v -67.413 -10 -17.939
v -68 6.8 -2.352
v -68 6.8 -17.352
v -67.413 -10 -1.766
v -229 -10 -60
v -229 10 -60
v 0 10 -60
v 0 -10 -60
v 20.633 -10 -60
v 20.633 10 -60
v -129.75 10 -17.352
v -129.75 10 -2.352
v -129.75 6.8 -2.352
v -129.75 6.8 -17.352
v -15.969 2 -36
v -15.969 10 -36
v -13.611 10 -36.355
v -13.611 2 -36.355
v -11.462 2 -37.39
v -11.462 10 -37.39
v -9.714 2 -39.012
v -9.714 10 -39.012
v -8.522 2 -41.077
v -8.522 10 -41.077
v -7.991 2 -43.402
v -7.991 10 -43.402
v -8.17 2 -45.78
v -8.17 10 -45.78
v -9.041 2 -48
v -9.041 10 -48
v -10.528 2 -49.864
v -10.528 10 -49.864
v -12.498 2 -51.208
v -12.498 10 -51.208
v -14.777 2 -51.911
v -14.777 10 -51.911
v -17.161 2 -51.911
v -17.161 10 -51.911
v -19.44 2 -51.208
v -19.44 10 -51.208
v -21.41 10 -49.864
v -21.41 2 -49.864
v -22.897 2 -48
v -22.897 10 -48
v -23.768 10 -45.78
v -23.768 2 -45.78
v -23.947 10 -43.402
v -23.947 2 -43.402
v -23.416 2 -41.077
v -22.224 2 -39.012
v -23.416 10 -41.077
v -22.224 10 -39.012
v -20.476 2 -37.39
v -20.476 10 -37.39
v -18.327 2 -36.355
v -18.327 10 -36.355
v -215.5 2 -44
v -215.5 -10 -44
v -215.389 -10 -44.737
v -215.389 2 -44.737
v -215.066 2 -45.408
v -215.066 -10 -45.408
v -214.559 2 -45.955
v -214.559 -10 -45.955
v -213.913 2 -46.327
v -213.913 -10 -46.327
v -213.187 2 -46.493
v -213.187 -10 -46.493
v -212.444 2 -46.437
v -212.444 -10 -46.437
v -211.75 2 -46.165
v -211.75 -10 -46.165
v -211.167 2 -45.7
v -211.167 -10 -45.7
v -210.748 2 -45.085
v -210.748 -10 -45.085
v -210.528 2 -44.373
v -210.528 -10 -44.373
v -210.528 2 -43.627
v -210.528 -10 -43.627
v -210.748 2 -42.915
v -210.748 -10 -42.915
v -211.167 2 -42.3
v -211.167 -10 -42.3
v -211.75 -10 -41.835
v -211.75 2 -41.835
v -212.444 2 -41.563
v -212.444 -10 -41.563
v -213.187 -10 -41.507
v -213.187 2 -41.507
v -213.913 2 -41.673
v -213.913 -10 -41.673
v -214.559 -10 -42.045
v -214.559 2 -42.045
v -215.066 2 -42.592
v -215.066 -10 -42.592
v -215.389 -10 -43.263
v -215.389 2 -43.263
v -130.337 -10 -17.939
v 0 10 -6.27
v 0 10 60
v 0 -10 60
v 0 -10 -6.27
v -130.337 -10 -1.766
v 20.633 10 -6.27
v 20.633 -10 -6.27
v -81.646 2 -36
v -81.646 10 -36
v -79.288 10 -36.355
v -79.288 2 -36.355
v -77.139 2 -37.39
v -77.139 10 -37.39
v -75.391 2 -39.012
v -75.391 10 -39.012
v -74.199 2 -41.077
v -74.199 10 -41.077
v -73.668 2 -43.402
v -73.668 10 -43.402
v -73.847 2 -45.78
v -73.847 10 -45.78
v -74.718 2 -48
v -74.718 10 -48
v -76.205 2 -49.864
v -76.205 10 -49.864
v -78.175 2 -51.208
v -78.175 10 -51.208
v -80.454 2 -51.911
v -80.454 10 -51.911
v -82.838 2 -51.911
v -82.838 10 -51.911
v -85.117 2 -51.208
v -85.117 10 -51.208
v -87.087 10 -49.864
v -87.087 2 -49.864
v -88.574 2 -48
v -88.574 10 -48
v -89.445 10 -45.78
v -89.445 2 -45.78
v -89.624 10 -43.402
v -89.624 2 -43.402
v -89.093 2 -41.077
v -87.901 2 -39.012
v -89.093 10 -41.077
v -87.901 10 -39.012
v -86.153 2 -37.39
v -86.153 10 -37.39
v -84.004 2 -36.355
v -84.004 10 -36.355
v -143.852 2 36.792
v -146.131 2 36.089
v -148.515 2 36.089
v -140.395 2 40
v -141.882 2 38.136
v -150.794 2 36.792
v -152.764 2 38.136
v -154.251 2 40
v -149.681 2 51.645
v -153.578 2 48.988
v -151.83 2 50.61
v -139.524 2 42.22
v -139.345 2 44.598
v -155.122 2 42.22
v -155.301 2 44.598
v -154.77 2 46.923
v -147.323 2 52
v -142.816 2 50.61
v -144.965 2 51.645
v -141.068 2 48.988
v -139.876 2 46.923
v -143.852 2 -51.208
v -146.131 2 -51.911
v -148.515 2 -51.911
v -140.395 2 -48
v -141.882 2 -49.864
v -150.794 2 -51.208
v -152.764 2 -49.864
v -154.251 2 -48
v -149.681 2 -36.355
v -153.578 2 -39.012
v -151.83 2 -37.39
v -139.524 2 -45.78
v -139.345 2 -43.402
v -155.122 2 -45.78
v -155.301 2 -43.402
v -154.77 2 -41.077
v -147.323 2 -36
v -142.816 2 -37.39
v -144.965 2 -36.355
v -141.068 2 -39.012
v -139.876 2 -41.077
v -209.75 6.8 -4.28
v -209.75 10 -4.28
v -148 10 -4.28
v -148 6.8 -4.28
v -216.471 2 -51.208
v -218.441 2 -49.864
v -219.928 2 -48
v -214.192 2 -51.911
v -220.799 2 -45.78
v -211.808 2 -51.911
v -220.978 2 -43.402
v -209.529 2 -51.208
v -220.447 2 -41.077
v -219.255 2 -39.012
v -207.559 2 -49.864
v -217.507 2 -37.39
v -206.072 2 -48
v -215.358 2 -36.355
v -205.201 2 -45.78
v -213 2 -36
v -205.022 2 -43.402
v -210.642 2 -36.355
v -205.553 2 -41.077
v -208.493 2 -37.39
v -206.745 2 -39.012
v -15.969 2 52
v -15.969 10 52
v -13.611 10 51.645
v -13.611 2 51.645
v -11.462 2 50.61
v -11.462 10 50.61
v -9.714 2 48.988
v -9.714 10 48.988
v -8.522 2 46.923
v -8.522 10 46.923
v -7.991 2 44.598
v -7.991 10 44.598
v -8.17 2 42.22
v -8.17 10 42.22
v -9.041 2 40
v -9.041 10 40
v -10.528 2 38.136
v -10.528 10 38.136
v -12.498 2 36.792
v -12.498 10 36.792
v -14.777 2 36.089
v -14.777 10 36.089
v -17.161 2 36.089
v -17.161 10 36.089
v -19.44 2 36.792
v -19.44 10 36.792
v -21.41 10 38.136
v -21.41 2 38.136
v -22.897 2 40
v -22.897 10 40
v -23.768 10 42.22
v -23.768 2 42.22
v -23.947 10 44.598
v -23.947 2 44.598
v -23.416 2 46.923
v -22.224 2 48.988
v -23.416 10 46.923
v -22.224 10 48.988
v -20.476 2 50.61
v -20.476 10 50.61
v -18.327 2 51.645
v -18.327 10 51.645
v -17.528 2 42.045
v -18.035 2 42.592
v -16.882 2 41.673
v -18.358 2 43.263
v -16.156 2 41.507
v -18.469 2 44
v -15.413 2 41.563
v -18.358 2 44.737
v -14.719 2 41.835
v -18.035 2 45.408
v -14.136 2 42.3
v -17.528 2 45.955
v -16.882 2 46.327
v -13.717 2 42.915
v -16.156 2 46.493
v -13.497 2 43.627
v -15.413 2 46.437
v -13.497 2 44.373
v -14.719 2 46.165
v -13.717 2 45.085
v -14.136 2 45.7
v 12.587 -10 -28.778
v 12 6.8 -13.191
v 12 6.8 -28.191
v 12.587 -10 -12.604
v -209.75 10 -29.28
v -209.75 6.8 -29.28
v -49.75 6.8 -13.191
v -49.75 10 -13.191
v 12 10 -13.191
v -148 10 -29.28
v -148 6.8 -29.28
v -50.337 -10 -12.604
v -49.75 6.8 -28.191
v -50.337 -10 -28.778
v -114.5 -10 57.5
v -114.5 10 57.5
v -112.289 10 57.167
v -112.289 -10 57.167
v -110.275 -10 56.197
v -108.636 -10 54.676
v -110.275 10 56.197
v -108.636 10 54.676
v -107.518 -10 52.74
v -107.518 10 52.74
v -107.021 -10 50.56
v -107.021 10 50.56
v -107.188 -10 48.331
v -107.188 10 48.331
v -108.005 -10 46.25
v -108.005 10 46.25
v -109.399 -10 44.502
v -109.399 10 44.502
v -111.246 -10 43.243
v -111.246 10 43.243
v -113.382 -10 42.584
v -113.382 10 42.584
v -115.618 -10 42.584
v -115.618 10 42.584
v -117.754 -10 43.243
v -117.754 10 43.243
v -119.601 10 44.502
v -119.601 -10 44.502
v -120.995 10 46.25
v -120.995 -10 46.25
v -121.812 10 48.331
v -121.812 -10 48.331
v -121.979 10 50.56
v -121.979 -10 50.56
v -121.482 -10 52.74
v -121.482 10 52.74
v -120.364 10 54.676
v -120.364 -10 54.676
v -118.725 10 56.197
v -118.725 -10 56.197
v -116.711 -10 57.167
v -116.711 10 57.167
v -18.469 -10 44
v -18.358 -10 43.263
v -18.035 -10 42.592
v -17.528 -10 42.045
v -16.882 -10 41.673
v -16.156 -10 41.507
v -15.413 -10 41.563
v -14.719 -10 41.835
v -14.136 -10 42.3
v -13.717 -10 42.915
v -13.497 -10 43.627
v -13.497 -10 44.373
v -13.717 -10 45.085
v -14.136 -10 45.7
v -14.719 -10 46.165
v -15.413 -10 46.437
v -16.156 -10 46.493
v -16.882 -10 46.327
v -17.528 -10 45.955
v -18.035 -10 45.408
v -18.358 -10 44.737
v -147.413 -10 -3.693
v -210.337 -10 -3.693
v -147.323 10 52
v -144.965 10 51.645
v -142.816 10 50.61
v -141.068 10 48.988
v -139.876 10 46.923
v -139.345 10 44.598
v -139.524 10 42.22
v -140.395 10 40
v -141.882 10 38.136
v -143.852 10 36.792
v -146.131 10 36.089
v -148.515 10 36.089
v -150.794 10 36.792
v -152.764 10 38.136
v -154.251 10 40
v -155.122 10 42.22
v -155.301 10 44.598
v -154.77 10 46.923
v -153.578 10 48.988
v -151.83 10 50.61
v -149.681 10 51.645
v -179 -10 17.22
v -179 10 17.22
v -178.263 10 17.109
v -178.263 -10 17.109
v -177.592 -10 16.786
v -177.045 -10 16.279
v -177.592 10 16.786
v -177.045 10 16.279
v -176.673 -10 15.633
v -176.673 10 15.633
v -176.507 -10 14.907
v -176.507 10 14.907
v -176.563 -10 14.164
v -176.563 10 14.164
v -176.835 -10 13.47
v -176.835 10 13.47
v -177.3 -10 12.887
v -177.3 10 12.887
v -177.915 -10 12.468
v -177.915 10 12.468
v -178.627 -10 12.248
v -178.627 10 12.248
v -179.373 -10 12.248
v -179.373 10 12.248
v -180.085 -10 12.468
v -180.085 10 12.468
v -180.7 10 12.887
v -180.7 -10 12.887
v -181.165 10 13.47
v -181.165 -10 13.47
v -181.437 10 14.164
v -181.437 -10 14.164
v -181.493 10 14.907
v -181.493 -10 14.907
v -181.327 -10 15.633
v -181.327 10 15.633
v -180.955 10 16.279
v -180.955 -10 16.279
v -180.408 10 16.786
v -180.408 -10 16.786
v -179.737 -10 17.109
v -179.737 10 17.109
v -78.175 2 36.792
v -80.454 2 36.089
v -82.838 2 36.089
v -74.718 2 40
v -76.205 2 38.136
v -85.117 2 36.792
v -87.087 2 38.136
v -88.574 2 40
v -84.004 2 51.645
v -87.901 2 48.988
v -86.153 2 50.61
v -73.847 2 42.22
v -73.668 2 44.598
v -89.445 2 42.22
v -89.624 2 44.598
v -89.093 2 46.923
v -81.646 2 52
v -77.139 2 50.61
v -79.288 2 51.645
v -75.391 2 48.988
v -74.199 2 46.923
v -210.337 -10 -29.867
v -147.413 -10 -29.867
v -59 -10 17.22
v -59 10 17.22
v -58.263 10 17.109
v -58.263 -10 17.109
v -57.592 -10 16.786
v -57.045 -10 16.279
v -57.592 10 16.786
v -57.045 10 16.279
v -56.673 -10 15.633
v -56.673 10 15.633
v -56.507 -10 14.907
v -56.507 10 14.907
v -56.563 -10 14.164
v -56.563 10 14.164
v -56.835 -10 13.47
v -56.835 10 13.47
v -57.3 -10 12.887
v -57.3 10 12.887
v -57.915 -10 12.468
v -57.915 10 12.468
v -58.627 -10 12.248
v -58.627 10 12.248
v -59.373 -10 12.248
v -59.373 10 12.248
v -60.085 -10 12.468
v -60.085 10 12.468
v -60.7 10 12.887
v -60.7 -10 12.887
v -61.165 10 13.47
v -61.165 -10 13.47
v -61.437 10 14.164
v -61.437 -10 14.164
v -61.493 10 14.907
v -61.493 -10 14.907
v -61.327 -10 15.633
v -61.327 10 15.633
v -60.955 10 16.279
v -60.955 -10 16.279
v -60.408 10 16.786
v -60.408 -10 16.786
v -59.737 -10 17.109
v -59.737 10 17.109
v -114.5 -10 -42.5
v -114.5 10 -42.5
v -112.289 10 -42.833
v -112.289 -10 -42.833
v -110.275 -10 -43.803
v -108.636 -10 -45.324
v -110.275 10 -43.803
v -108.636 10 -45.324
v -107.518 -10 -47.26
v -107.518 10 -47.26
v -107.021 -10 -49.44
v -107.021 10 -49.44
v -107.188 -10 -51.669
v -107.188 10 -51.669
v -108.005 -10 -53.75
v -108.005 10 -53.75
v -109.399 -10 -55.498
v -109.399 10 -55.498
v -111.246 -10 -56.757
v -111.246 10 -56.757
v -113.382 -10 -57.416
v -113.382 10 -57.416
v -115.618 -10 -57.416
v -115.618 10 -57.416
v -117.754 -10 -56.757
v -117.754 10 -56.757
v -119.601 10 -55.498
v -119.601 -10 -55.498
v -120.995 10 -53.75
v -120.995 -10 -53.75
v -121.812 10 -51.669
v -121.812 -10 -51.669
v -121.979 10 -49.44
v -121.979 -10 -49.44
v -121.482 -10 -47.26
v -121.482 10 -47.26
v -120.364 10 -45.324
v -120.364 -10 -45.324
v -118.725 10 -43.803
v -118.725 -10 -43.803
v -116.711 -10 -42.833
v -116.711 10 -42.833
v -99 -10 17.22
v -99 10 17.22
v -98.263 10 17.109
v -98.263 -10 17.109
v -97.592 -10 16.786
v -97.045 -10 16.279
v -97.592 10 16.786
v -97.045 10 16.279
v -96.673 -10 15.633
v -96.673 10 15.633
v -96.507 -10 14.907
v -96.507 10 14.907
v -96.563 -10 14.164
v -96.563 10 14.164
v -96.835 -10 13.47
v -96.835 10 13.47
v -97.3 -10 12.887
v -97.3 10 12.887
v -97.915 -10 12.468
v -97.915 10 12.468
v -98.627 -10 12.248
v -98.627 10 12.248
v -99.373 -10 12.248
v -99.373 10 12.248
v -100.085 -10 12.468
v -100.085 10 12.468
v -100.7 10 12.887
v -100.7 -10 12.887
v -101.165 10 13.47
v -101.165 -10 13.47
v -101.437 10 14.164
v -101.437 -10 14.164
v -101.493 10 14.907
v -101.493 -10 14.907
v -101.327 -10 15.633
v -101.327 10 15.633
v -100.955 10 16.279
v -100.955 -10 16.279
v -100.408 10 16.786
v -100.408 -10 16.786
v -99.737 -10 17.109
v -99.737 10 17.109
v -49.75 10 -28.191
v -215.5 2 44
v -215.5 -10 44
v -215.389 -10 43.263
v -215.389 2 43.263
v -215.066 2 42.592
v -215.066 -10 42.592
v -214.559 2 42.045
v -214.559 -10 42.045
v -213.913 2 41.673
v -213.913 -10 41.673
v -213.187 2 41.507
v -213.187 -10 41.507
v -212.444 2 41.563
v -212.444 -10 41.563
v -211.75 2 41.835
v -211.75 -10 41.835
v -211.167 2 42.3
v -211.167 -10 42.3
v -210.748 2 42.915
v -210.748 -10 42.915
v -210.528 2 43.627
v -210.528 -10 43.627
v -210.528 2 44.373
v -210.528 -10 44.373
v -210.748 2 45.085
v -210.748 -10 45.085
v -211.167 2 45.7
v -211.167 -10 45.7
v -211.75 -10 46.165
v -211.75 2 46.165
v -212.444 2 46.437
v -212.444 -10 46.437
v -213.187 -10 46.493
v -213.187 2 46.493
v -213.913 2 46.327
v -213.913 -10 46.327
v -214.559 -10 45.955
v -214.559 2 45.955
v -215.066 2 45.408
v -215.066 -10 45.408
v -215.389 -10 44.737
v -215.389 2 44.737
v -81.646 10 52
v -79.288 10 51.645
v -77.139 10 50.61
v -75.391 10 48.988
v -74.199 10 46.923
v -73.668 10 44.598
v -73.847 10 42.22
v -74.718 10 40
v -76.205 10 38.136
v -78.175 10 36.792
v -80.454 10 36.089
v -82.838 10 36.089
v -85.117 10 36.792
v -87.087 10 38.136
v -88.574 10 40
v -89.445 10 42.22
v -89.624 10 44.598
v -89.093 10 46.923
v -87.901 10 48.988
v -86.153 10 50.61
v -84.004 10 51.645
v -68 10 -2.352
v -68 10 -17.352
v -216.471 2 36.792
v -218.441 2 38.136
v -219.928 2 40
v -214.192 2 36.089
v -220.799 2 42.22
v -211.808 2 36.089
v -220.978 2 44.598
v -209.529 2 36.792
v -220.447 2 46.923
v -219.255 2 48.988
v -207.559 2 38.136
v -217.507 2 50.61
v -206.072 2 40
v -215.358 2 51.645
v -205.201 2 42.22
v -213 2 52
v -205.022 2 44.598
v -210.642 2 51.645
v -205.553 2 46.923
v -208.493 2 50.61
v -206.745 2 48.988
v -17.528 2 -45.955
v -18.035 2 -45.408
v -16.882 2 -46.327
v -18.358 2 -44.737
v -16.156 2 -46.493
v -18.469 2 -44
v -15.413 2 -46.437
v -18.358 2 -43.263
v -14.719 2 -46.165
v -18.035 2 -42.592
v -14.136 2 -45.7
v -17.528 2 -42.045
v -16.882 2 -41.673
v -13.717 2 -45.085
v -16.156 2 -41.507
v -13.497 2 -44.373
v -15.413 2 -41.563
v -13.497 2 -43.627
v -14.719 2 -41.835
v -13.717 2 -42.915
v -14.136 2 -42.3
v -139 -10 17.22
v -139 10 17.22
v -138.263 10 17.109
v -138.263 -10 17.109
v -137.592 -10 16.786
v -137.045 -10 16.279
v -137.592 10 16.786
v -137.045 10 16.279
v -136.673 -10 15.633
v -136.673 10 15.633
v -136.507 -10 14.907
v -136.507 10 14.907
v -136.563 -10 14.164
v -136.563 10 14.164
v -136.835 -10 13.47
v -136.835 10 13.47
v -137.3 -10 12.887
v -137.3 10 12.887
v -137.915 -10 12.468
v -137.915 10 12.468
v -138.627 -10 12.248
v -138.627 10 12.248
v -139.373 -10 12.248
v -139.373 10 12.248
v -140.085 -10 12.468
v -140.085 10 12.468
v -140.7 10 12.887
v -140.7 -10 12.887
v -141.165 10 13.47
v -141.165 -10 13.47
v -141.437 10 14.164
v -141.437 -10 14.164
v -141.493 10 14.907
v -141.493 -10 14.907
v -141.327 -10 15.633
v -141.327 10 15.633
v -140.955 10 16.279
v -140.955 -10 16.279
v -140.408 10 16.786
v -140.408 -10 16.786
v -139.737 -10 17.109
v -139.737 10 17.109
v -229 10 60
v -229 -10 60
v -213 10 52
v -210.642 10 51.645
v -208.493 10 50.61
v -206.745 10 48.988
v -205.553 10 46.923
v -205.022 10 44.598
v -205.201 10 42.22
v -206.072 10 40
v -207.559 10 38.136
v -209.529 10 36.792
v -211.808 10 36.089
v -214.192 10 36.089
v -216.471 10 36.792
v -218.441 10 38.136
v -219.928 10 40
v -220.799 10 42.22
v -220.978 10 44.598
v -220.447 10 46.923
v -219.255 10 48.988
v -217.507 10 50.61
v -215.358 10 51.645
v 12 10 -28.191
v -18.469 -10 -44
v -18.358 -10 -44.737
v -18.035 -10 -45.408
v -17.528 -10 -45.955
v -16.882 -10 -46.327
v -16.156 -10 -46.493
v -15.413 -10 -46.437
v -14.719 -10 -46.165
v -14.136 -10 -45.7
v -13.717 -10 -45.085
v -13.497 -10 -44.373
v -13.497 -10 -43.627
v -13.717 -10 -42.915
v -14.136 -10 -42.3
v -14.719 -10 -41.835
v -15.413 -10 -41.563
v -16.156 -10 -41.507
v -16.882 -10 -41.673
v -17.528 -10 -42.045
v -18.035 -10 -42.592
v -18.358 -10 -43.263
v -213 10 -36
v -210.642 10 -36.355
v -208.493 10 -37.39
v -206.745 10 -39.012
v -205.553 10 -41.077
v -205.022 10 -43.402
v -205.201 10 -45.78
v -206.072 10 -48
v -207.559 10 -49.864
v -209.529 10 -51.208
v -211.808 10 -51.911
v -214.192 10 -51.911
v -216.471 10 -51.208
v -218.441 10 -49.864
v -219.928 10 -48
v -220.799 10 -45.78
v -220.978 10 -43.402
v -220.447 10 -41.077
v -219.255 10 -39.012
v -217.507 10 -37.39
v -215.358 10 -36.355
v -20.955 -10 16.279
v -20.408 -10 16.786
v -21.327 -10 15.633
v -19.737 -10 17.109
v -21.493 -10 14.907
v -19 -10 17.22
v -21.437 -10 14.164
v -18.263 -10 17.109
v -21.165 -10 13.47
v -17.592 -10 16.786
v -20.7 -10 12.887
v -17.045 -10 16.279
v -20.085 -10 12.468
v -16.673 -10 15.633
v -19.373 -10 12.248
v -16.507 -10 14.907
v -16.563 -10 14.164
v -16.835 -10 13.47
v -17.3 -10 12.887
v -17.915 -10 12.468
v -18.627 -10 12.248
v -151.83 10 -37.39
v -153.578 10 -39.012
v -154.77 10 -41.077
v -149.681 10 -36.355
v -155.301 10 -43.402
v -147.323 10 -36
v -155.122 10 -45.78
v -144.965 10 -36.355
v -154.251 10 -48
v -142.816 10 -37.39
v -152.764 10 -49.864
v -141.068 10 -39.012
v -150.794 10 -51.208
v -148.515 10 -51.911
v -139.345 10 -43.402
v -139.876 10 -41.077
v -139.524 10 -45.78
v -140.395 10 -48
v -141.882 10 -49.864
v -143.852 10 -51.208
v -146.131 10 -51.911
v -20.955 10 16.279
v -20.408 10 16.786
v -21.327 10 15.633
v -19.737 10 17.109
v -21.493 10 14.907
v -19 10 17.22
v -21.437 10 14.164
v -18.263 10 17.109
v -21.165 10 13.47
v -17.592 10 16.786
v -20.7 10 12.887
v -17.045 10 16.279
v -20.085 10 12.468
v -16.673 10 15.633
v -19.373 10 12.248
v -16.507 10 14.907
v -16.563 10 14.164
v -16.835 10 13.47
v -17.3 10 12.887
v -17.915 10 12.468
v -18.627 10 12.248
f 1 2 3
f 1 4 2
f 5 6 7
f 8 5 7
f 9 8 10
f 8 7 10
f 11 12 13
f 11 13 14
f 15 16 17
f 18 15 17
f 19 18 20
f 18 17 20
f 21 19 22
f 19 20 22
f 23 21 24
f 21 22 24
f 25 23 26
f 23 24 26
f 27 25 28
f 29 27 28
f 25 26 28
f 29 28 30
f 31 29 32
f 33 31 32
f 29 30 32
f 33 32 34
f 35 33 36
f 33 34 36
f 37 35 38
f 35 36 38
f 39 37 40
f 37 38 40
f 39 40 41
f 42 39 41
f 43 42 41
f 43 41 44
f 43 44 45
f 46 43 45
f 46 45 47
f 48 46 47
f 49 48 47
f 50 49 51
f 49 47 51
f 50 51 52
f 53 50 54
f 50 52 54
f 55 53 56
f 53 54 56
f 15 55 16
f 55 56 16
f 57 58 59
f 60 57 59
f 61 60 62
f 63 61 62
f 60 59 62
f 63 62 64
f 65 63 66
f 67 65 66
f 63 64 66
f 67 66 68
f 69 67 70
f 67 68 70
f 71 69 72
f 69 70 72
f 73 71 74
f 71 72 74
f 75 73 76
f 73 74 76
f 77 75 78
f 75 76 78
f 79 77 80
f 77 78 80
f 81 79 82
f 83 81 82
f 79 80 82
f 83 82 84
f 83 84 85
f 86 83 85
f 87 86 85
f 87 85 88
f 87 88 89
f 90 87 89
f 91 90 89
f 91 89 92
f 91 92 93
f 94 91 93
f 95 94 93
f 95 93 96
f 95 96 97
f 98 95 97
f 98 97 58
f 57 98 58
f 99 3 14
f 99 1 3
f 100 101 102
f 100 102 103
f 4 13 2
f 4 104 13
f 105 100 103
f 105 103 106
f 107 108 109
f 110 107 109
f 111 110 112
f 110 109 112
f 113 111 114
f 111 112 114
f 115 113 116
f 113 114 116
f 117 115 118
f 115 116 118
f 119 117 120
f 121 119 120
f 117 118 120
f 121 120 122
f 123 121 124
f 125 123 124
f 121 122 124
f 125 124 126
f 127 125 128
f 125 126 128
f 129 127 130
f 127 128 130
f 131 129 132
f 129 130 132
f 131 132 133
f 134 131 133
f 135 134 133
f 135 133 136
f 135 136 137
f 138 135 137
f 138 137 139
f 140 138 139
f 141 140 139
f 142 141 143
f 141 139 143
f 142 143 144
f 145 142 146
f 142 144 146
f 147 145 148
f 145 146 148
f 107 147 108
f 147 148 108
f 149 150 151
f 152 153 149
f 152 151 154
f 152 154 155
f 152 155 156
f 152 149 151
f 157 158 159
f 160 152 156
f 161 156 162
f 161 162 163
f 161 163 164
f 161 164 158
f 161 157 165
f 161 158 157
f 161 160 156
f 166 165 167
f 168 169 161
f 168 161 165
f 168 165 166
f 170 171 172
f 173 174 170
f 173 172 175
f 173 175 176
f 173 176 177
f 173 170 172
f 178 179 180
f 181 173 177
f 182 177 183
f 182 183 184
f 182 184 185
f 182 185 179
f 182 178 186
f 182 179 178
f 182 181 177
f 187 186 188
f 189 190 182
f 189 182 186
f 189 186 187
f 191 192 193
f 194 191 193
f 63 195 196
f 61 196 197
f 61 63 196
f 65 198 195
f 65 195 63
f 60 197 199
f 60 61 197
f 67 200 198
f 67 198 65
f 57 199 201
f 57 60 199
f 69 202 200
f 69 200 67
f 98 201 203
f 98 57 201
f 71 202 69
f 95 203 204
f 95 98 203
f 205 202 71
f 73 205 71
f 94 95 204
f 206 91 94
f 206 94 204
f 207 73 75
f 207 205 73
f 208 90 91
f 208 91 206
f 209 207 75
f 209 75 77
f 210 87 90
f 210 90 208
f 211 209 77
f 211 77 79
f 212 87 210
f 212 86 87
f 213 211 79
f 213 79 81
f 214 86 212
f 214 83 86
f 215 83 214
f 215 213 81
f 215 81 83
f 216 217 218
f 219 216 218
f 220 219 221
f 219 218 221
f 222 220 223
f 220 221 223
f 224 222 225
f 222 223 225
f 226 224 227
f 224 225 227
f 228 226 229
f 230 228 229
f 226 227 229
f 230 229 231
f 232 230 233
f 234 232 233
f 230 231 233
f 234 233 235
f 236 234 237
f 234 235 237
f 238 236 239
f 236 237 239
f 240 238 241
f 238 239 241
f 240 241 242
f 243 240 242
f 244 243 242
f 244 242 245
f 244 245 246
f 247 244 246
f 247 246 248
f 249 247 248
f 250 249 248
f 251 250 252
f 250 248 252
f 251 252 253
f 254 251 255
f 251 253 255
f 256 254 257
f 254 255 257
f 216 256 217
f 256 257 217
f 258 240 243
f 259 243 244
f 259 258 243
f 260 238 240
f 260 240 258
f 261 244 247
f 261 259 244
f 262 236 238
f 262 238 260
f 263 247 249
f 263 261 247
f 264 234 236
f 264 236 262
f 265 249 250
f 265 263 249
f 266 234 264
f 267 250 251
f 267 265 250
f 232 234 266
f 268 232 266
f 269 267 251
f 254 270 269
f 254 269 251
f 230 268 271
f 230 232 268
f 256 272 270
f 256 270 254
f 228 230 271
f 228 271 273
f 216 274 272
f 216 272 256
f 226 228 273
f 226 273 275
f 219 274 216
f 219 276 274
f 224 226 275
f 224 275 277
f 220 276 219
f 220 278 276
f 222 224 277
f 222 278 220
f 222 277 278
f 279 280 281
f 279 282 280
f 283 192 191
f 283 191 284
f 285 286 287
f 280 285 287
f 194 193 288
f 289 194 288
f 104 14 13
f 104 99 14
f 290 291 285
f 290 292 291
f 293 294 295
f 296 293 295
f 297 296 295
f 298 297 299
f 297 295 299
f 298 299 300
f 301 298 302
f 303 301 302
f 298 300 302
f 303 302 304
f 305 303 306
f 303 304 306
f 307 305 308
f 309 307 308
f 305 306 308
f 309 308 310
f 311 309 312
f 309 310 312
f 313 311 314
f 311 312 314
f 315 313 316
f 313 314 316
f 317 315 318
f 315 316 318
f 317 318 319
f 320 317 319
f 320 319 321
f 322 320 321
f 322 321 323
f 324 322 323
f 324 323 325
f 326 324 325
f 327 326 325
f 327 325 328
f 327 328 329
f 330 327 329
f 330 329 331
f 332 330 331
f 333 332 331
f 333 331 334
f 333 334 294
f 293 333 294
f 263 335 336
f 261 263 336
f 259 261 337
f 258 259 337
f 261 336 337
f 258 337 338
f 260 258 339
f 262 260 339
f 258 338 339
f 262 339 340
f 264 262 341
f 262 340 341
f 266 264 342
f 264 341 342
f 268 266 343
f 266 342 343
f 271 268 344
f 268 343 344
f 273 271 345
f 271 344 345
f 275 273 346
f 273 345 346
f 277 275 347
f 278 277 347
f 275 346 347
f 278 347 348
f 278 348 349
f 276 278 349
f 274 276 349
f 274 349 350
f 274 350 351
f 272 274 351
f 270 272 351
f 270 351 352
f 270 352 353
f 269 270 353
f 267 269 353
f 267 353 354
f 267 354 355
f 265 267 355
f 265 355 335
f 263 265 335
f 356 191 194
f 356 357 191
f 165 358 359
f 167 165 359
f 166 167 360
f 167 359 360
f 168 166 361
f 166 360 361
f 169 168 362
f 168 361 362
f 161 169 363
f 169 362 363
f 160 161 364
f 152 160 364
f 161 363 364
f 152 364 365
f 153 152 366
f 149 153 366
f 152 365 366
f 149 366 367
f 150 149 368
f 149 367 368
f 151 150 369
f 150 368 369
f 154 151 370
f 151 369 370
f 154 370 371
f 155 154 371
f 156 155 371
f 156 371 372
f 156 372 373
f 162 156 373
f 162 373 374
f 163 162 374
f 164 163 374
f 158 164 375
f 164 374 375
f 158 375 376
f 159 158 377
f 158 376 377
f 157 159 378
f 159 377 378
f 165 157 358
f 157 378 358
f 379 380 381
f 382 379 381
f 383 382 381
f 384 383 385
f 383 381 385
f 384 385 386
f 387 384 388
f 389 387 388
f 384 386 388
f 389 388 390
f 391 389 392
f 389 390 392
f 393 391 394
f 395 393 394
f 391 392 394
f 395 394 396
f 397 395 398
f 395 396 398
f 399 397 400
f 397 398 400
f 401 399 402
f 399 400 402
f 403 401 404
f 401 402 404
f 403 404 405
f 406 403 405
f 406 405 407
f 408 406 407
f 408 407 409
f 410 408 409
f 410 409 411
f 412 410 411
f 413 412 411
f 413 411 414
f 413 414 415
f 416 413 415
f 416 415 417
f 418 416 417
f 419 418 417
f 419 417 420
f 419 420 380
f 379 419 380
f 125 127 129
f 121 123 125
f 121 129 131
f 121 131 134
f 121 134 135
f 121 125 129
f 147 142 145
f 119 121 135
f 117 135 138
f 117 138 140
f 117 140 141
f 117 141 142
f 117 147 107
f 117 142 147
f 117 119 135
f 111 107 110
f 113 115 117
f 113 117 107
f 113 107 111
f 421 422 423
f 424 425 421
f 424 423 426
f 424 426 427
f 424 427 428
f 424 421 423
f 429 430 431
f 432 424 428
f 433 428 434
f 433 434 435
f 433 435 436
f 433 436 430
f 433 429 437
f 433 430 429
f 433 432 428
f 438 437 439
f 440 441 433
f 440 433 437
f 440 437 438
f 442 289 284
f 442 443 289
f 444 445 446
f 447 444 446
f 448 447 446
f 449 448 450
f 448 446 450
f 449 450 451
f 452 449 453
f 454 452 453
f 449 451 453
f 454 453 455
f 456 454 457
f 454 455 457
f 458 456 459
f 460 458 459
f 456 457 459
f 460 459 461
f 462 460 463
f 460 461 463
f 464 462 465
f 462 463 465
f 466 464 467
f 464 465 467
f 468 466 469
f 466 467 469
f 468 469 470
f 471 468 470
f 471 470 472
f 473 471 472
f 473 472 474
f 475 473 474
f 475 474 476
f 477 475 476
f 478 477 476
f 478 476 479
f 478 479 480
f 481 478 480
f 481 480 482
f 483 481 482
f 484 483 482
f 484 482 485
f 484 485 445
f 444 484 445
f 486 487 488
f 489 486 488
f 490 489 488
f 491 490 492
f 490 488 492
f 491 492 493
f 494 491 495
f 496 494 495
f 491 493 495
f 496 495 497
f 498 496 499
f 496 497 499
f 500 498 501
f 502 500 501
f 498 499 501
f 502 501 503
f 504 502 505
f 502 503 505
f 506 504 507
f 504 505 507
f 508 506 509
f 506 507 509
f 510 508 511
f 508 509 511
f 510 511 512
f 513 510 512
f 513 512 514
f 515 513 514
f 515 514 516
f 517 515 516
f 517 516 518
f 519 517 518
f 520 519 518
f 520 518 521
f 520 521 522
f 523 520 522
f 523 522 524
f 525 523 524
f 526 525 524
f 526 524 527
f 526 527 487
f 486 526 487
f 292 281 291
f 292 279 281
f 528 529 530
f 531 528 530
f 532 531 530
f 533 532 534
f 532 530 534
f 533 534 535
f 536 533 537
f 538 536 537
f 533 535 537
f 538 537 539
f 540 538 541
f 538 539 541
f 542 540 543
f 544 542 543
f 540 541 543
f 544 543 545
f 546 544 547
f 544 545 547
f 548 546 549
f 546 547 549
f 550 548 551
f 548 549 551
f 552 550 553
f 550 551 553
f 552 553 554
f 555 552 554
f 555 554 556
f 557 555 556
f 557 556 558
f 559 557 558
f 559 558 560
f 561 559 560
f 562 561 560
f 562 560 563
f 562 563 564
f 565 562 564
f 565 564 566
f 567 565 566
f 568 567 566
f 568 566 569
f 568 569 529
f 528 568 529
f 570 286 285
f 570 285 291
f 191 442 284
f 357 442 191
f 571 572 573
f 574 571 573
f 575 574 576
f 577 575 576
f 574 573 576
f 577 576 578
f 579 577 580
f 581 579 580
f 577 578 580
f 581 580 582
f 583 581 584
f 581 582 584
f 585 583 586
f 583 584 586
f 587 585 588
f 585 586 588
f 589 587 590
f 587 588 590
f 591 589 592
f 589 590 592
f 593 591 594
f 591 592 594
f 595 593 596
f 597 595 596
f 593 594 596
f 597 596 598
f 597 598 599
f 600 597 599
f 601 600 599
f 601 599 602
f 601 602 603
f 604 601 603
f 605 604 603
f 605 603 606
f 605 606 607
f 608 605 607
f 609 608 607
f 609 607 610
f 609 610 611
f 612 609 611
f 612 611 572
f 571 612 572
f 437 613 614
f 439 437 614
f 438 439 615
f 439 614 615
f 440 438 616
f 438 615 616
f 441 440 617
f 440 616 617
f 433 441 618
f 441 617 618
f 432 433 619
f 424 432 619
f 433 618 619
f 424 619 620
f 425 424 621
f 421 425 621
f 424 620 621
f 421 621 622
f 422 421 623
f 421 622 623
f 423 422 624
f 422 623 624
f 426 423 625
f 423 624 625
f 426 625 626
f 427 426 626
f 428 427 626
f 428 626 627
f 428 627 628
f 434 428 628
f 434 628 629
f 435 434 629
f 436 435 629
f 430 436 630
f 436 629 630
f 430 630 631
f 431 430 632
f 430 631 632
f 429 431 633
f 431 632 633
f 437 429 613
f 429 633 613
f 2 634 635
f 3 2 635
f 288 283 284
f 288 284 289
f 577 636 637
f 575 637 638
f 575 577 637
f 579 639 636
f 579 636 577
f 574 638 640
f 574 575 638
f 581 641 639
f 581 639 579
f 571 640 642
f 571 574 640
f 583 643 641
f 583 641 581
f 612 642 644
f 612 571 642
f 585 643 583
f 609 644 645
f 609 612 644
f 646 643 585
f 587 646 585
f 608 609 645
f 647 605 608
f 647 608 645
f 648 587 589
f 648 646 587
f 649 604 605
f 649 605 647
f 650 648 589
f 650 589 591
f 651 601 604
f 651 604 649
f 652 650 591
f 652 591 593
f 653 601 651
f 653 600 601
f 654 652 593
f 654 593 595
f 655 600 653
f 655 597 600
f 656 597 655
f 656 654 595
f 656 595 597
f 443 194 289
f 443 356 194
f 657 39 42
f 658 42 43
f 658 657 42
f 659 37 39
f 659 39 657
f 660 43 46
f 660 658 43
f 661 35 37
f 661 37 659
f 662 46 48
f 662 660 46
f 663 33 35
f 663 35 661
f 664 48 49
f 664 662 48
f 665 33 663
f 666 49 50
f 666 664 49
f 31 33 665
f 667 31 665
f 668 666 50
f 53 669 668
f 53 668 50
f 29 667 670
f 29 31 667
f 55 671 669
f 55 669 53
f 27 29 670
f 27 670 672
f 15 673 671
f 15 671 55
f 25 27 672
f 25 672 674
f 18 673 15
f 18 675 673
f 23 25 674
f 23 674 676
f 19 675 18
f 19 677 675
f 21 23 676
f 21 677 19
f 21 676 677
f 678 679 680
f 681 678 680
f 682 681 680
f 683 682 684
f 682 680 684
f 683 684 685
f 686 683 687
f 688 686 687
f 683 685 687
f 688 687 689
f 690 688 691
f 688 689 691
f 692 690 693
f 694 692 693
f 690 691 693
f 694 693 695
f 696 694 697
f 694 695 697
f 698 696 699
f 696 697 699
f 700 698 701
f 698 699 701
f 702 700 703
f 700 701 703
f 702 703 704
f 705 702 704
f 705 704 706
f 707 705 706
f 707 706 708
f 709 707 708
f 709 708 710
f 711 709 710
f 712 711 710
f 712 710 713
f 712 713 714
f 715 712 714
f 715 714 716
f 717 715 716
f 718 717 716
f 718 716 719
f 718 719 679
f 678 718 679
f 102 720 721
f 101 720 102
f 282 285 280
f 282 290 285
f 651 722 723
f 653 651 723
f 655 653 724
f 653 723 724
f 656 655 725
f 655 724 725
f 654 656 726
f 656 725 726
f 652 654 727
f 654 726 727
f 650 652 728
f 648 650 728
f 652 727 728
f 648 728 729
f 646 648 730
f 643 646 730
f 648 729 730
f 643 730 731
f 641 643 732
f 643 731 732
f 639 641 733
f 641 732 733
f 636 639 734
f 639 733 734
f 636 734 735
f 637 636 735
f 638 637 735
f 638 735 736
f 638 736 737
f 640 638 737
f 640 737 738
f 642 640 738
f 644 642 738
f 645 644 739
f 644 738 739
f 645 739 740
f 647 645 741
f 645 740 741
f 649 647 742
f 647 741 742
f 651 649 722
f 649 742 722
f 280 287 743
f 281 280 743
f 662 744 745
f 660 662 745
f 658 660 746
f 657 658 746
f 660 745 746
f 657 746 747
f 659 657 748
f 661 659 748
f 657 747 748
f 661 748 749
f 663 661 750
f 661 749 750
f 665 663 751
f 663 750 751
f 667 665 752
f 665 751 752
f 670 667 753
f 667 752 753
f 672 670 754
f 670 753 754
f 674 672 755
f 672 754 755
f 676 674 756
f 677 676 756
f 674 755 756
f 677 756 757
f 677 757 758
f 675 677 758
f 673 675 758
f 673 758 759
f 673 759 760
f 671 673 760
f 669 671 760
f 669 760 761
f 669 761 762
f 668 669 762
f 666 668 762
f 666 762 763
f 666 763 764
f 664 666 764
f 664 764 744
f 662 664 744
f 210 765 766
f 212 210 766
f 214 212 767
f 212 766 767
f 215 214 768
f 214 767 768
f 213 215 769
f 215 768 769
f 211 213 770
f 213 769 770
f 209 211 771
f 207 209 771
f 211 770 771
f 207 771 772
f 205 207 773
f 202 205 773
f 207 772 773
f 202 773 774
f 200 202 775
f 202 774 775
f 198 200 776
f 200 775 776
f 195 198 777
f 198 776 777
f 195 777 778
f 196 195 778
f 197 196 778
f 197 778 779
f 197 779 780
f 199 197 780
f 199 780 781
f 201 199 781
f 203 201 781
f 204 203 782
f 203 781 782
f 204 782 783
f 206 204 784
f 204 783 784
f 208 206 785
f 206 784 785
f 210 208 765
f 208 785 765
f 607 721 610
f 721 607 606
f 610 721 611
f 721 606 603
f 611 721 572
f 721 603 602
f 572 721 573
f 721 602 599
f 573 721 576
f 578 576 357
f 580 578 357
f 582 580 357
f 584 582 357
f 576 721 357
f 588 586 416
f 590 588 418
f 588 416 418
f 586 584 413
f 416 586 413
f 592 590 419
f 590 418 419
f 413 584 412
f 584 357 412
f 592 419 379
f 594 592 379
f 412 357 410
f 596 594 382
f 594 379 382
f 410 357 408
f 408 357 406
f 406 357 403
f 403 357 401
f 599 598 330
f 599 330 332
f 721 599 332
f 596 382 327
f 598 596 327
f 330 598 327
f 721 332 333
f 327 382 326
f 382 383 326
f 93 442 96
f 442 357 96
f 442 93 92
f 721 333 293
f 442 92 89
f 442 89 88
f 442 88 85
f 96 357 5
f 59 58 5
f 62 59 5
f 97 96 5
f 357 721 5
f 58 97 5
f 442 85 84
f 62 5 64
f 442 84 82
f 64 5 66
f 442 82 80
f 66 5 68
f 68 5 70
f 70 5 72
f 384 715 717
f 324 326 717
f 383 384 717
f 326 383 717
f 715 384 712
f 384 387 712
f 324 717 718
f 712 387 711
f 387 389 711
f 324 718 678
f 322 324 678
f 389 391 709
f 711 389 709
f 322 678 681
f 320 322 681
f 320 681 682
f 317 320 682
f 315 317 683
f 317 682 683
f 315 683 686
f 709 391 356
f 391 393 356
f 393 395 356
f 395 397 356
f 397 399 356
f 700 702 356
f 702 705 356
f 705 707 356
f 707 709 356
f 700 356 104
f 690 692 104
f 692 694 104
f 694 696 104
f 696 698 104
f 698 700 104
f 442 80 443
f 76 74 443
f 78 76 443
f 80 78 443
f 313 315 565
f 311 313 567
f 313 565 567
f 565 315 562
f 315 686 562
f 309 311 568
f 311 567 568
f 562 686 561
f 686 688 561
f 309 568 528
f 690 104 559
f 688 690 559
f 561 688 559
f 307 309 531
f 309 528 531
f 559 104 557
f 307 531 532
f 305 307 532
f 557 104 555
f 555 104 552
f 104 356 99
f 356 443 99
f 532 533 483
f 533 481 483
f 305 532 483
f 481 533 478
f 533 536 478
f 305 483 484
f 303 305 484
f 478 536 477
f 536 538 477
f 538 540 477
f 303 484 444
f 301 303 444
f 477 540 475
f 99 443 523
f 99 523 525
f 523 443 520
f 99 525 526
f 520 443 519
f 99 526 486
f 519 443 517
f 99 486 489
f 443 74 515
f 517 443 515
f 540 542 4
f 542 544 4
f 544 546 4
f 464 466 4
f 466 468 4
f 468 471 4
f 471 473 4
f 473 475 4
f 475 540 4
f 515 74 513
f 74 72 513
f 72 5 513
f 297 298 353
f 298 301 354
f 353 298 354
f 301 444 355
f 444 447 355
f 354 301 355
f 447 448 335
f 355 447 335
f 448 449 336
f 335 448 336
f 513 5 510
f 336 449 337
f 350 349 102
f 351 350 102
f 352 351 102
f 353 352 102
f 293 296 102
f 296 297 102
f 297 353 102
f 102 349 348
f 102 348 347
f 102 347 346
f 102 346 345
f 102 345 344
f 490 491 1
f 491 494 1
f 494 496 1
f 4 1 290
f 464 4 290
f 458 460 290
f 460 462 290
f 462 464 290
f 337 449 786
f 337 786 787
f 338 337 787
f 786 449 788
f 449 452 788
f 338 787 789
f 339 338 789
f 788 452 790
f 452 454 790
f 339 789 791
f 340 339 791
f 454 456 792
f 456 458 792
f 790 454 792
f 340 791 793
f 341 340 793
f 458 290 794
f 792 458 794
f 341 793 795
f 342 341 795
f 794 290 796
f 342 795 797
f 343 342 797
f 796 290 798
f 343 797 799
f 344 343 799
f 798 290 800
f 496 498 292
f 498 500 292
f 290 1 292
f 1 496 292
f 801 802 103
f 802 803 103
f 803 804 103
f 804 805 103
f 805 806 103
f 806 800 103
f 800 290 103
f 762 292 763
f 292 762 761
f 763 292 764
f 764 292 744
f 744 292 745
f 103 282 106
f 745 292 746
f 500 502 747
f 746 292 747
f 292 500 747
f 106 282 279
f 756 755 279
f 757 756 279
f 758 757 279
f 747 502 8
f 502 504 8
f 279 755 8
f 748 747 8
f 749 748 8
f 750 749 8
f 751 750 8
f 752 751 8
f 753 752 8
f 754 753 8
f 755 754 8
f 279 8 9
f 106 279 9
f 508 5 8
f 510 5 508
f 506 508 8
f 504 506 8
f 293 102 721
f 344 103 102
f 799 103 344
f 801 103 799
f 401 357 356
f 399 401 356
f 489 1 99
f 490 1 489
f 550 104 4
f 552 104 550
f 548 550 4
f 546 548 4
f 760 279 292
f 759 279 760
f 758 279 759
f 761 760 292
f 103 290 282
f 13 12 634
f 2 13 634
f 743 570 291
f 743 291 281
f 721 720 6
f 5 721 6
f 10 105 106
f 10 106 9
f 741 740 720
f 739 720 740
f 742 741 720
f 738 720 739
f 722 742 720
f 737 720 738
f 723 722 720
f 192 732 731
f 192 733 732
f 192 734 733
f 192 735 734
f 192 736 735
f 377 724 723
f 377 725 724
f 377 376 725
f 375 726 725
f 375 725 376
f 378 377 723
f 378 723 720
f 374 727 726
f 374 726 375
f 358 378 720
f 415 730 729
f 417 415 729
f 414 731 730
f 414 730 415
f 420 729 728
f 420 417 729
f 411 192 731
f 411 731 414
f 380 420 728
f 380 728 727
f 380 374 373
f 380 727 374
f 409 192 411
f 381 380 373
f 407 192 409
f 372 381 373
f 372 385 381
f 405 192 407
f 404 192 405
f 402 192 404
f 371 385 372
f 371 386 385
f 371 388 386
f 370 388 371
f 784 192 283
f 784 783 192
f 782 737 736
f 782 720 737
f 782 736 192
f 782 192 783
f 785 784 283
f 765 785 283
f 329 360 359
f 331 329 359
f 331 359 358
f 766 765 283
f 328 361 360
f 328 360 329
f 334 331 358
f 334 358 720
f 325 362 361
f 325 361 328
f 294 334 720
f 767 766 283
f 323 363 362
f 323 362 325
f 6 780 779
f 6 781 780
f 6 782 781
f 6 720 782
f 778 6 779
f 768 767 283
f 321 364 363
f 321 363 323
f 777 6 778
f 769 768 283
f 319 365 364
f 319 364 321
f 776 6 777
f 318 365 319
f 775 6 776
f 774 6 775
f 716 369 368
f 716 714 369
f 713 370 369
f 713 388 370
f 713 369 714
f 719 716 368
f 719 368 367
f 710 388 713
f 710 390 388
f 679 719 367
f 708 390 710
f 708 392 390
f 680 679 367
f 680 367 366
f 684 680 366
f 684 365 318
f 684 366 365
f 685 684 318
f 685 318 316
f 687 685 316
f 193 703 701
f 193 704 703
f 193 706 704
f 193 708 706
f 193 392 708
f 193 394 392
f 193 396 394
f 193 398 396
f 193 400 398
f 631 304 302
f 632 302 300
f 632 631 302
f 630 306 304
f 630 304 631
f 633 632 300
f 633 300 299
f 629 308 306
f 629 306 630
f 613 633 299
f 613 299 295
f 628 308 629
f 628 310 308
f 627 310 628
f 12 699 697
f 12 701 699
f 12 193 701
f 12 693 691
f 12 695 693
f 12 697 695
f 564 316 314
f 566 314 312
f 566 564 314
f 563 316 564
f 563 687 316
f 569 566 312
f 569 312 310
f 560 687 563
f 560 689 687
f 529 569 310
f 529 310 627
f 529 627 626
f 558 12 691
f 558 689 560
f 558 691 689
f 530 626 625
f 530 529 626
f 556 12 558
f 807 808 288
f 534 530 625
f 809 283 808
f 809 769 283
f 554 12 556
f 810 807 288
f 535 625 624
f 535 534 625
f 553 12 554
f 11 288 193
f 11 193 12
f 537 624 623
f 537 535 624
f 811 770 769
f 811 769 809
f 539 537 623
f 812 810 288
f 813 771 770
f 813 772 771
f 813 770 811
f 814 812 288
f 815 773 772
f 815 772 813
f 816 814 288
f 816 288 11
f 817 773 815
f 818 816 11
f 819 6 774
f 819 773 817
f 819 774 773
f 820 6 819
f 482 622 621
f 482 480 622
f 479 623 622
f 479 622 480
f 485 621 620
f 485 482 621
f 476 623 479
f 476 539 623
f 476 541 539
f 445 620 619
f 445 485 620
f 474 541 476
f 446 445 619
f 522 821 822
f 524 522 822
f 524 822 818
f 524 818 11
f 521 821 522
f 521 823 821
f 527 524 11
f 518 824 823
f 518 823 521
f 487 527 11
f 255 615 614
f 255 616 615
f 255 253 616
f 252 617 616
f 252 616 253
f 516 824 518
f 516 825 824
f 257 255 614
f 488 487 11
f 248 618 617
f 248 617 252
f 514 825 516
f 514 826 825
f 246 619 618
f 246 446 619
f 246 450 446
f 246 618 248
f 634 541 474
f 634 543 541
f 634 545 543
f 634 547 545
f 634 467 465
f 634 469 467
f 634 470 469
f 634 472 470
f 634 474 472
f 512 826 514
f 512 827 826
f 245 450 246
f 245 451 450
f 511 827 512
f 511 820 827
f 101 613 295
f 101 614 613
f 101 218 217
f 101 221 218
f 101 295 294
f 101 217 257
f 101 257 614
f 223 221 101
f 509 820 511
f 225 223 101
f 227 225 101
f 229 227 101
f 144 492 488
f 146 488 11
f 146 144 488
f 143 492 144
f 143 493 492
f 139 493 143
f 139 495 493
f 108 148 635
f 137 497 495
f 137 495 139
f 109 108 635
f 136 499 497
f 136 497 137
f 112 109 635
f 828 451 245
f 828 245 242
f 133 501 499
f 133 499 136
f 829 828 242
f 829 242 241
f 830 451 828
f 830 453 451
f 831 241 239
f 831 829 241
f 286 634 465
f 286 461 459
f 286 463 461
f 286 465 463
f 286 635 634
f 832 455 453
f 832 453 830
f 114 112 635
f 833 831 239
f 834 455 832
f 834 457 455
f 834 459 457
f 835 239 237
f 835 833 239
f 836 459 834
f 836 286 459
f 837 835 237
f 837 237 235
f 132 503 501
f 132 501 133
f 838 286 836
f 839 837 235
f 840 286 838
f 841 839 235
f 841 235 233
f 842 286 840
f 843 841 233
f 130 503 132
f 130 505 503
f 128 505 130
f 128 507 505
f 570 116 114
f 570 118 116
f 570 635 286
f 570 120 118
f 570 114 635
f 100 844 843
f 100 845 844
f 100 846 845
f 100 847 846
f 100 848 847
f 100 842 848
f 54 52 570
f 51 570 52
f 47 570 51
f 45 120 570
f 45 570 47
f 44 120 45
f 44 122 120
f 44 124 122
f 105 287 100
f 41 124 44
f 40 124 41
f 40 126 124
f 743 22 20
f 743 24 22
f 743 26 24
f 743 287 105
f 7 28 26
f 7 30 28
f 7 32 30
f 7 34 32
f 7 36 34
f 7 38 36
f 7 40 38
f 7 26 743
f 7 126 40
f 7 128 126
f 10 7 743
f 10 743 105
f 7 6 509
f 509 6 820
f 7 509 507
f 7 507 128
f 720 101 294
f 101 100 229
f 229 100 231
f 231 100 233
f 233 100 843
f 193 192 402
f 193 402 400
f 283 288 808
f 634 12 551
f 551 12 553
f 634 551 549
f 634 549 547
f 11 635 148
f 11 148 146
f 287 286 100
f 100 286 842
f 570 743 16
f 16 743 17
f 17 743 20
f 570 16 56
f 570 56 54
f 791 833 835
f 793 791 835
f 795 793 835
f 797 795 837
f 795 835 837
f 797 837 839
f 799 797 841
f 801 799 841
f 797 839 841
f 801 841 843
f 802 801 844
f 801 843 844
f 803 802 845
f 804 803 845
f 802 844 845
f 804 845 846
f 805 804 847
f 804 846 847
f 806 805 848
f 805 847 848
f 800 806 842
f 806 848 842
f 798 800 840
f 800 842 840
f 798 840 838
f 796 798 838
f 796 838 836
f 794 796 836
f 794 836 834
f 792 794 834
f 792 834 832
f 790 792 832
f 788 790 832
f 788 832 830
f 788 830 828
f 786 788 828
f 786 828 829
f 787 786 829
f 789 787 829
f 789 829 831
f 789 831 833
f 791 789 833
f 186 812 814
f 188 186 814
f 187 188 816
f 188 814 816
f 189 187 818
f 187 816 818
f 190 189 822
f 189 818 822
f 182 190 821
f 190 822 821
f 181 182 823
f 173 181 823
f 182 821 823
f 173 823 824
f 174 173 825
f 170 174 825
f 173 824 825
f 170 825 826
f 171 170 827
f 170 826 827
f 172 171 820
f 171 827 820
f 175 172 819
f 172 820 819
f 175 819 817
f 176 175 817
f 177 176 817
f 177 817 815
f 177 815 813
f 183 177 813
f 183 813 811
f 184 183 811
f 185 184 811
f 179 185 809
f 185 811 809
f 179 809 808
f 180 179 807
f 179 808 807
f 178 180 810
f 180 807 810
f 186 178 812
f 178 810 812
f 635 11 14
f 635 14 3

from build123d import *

# Parameters (mm, degrees)
SKETCH1_W            = 229
SKETCH1_H            = 120
BOSS_EXTRUDE1_DEPTH  = 10
SKETCH4_W            = 20.632503002
SKETCH4_H            = 53.730004003
BOSS_EXTRUDE2_DEPTH  = 20
CUT_EXTRUDE1_REACH   = 239.573
SKETCH5_W            = 61.75
SKETCH5_H            = 15
SKETCH5_H_2          = 25
CUT_EXTRUDE2_REACH   = 239.573
SKETCH6_R            = 2.5
CUT_EXTRUDE3_REACH   = 239.573
SKETCH7_R            = 7.5
SKETCH8_R            = 8
CUT_EXTRUDE4_DEPTH   = 8
LPATTERN2_COUNT      = 4
LPATTERN2_PITCH      = 65.677
LPATTERN2_COUNT_DIR2 = 2
LPATTERN2_PITCH_DIR2 = 88
M6_TAPPED_HOLE2_D    = 5


with BuildPart() as part:
    # Sketch1 → Boss-Extrude1 (new, symmetric)
    with BuildSketch(Plane(origin=(0, 0, 0), x_dir=(1, 0, 0), z_dir=(0, 1, 0))):
        with Locations((-114.5, 0)):
            Rectangle(SKETCH1_W, SKETCH1_H)
    extrude(amount=BOSS_EXTRUDE1_DEPTH, both=True)

    # Sketch4 → Boss-Extrude2 (add)
    with BuildSketch(Plane(origin=(0, 10, 0), x_dir=(1, 0, 0), z_dir=(0, 1, 0))):
        with Locations((10.316251501, 33.134997999)):
            Rectangle(SKETCH4_W, SKETCH4_H)
    extrude(amount=-BOSS_EXTRUDE2_DEPTH)

    # Sketch5 → Cut-Extrude1 (cut, up to next)
    with BuildSketch(Plane(origin=(0, 10, 0), x_dir=(1, 0, 0), z_dir=(0, 1, 0)), mode=Mode.PRIVATE) as cut_extrude1_sk1:
        with Locations((-98.875, 9.852366083)):
            Rectangle(SKETCH5_W, SKETCH5_H)
    cut_extrude1_tool1 = extrude(cut_extrude1_sk1.sketch, amount=-CUT_EXTRUDE1_REACH, mode=Mode.PRIVATE) & part.part
    # Sketch5 → Cut-Extrude1 (cut, up to next)
    with BuildSketch(Plane(origin=(0, 10, 0), x_dir=(1, 0, 0), z_dir=(0, 1, 0)), mode=Mode.PRIVATE) as cut_extrude1_sk2:
        with Locations((-18.875, 20.69101)):
            Rectangle(SKETCH5_W, SKETCH5_H)
    cut_extrude1_tool2 = extrude(cut_extrude1_sk2.sketch, amount=-CUT_EXTRUDE1_REACH, mode=Mode.PRIVATE) & part.part
    # Sketch5 → Cut-Extrude1 (cut, up to next)
    with BuildSketch(Plane(origin=(0, 10, 0), x_dir=(1, 0, 0), z_dir=(0, 1, 0)), mode=Mode.PRIVATE) as cut_extrude1_sk3:
        with Locations((-178.875, 16.78)):
            Rectangle(SKETCH5_W, SKETCH5_H_2)
    cut_extrude1_tool3 = extrude(cut_extrude1_sk3.sketch, amount=-CUT_EXTRUDE1_REACH, mode=Mode.PRIVATE) & part.part
    add(cut_extrude1_tool1.solids().sort_by_distance((-98.875, 10, -9.852366))[0], mode=Mode.SUBTRACT)
    add(cut_extrude1_tool2.solids().sort_by_distance((-18.875, 10, -20.69101))[0], mode=Mode.SUBTRACT)
    add(cut_extrude1_tool3.solids().sort_by_distance((-178.875, 10, -16.78))[0], mode=Mode.SUBTRACT)

    # Sketch6 → Cut-Extrude2 (cut, up to next)
    with BuildSketch(Plane(origin=(0, 10, 0), x_dir=(1, 0, 0), z_dir=(0, 1, 0)), mode=Mode.PRIVATE) as cut_extrude2_sk1:
        with Locations(Location((-179, -14.72, 0), (0, 0, 270))):
            Circle(SKETCH6_R)
    cut_extrude2_tool1 = extrude(cut_extrude2_sk1.sketch, amount=-CUT_EXTRUDE2_REACH, mode=Mode.PRIVATE) & part.part
    # Sketch6 → Cut-Extrude2 (cut, up to next)
    with BuildSketch(Plane(origin=(0, 10, 0), x_dir=(1, 0, 0), z_dir=(0, 1, 0)), mode=Mode.PRIVATE) as cut_extrude2_sk2:
        with Locations(Location((-139, -14.72, 0), (0, 0, 270))):
            Circle(SKETCH6_R)
    cut_extrude2_tool2 = extrude(cut_extrude2_sk2.sketch, amount=-CUT_EXTRUDE2_REACH, mode=Mode.PRIVATE) & part.part
    # Sketch6 → Cut-Extrude2 (cut, up to next)
    with BuildSketch(Plane(origin=(0, 10, 0), x_dir=(1, 0, 0), z_dir=(0, 1, 0)), mode=Mode.PRIVATE) as cut_extrude2_sk3:
        with Locations(Location((-99, -14.72, 0), (0, 0, 270))):
            Circle(SKETCH6_R)
    cut_extrude2_tool3 = extrude(cut_extrude2_sk3.sketch, amount=-CUT_EXTRUDE2_REACH, mode=Mode.PRIVATE) & part.part
    # Sketch6 → Cut-Extrude2 (cut, up to next)
    with BuildSketch(Plane(origin=(0, 10, 0), x_dir=(1, 0, 0), z_dir=(0, 1, 0)), mode=Mode.PRIVATE) as cut_extrude2_sk4:
        with Locations(Location((-59, -14.72, 0), (0, 0, 270))):
            Circle(SKETCH6_R)
    cut_extrude2_tool4 = extrude(cut_extrude2_sk4.sketch, amount=-CUT_EXTRUDE2_REACH, mode=Mode.PRIVATE) & part.part
    # Sketch6 → Cut-Extrude2 (cut, up to next)
    with BuildSketch(Plane(origin=(0, 10, 0), x_dir=(1, 0, 0), z_dir=(0, 1, 0)), mode=Mode.PRIVATE) as cut_extrude2_sk5:
        with Locations(Location((-19, -14.72, 0), (0, 0, 270))):
            Circle(SKETCH6_R)
    cut_extrude2_tool5 = extrude(cut_extrude2_sk5.sketch, amount=-CUT_EXTRUDE2_REACH, mode=Mode.PRIVATE) & part.part
    add(cut_extrude2_tool1.solids().sort_by_distance((-179, 10, 14.72))[0], mode=Mode.SUBTRACT)
    add(cut_extrude2_tool2.solids().sort_by_distance((-139, 10, 14.72))[0], mode=Mode.SUBTRACT)
    add(cut_extrude2_tool3.solids().sort_by_distance((-99, 10, 14.72))[0], mode=Mode.SUBTRACT)
    add(cut_extrude2_tool4.solids().sort_by_distance((-59, 10, 14.72))[0], mode=Mode.SUBTRACT)
    add(cut_extrude2_tool5.solids().sort_by_distance((-19, 10, 14.72))[0], mode=Mode.SUBTRACT)

    # Sketch7 → Cut-Extrude3 (cut, up to next)
    with BuildSketch(Plane(origin=(0, 10, 0), x_dir=(1, 0, 0), z_dir=(0, 1, 0)), mode=Mode.PRIVATE) as cut_extrude3_sk1:
        with Locations(Location((-114.5, 50, 0), (0, 0, 270))):
            Circle(SKETCH7_R)
    cut_extrude3_tool1 = extrude(cut_extrude3_sk1.sketch, amount=-CUT_EXTRUDE3_REACH, mode=Mode.PRIVATE) & part.part
    # Sketch7 → Cut-Extrude3 (cut, up to next)
    with BuildSketch(Plane(origin=(0, 10, 0), x_dir=(1, 0, 0), z_dir=(0, 1, 0)), mode=Mode.PRIVATE) as cut_extrude3_sk2:
        with Locations(Location((-114.5, -50, 0), (0, 0, 270))):
            Circle(SKETCH7_R)
    cut_extrude3_tool2 = extrude(cut_extrude3_sk2.sketch, amount=-CUT_EXTRUDE3_REACH, mode=Mode.PRIVATE) & part.part
    add(cut_extrude3_tool1.solids().sort_by_distance((-114.5, 10, -50))[0], mode=Mode.SUBTRACT)
    add(cut_extrude3_tool2.solids().sort_by_distance((-114.5, 10, 50))[0], mode=Mode.SUBTRACT)

    # Draft1: read off the stored shape, not the designer's step
    # Draft1: loft between two sections, ruled curve by curve
    draft1_from = [
        Edge.make_line((-129.75, 6.8, -17.352366083), (-129.75, 6.8, -2.352366083)),
        Edge.make_line((-68, 6.8, -17.352366083), (-129.75, 6.8, -17.352366083)),
        Edge.make_line((-68, 6.8, -2.352366083), (-68, 6.8, -17.352366083)),
        Edge.make_line((-129.75, 6.8, -2.352366083), (-68, 6.8, -2.352366083)),
    ]
    draft1_to = [
        Edge.make_line((-130.336668927, -10, -17.93903501), (-130.336668927, -10, -1.765697156)),
        Edge.make_line((-67.413331073, -10, -17.93903501), (-130.336668927, -10, -17.93903501)),
        Edge.make_line((-67.413331073, -10, -1.765697156), (-67.413331073, -10, -17.93903501)),
        Edge.make_line((-130.336668927, -10, -1.765697156), (-67.413331073, -10, -1.765697156)),
    ]
    draft1 = Solid(Shell([*[Face.make_surface_from_curves(draft1_from[k], draft1_to[k]) for k in range(4)], Face(Wire(draft1_from)), Face(Wire(draft1_to))]))
    add(draft1, mode=Mode.SUBTRACT)

    # Draft1 2: loft between two sections, ruled curve by curve
    draft1_2_from = [
        Edge.make_line((-49.75, 6.8, -28.19101), (-49.75, 6.8, -13.19101)),
        Edge.make_line((12, 6.8, -28.19101), (-49.75, 6.8, -28.19101)),
        Edge.make_line((12, 6.8, -13.19101), (12, 6.8, -28.19101)),
        Edge.make_line((-49.75, 6.8, -13.19101), (12, 6.8, -13.19101)),
    ]
    draft1_2_to = [
        Edge.make_line((-50.336668927, -10, -28.777678927), (-50.336668927, -10, -12.604341073)),
        Edge.make_line((12.586668927, -10, -28.777678927), (-50.336668927, -10, -28.777678927)),
        Edge.make_line((12.586668927, -10, -12.604341073), (12.586668927, -10, -28.777678927)),
        Edge.make_line((-50.336668927, -10, -12.604341073), (12.586668927, -10, -12.604341073)),
    ]
    draft1_2 = Solid(Shell([*[Face.make_surface_from_curves(draft1_2_from[k], draft1_2_to[k]) for k in range(4)], Face(Wire(draft1_2_from)), Face(Wire(draft1_2_to))]))
    add(draft1_2, mode=Mode.SUBTRACT)

    # Draft1 3: loft between two sections, ruled curve by curve
    draft1_3_from = [
        Edge.make_line((-209.75, 6.8, -29.28), (-209.75, 6.8, -4.28)),
        Edge.make_line((-148, 6.8, -29.28), (-209.75, 6.8, -29.28)),
        Edge.make_line((-148, 6.8, -4.28), (-148, 6.8, -29.28)),
        Edge.make_line((-209.75, 6.8, -4.28), (-148, 6.8, -4.28)),
    ]
    draft1_3_to = [
        Edge.make_line((-210.336668927, -10, -29.866668927), (-210.336668927, -10, -3.693331073)),
        Edge.make_line((-147.413331073, -10, -29.866668927), (-210.336668927, -10, -29.866668927)),
        Edge.make_line((-147.413331073, -10, -3.693331073), (-147.413331073, -10, -29.866668927)),
        Edge.make_line((-210.336668927, -10, -3.693331073), (-147.413331073, -10, -3.693331073)),
    ]
    draft1_3 = Solid(Shell([*[Face.make_surface_from_curves(draft1_3_from[k], draft1_3_to[k]) for k in range(4)], Face(Wire(draft1_3_from)), Face(Wire(draft1_3_to))]))
    add(draft1_3, mode=Mode.SUBTRACT)

    # Sketch8 → Cut-Extrude4 (cut)
    with BuildSketch(Plane(origin=(0, 10, 0), x_dir=(1, 0, 0), z_dir=(0, 1, 0))):
        with Locations(Location((-213, 44, 0), (0, 0, 270))):
            Circle(SKETCH8_R)
    cut_extrude4 = extrude(amount=-CUT_EXTRUDE4_DEPTH, mode=Mode.SUBTRACT)

    # LPattern2: Cut-Extrude4 4 × 2
    with Locations(*[(i * LPATTERN2_PITCH, 0, j * LPATTERN2_PITCH_DIR2) for i in range(LPATTERN2_COUNT) for j in range(LPATTERN2_COUNT_DIR2) if (i, j) != (0, 0)]):
        add(cut_extrude4, mode=Mode.SUBTRACT)

    # M6 Tapped Hole2 (through all)
    with Locations(Plane(origin=(0, 2, 0), x_dir=(1, 0, 0), z_dir=(0, 1, 0))):
        with Locations((-213, 44), (-15.969, 44), (-15.969, -44), (-213, -44)):
            Hole(M6_TAPPED_HOLE2_D / 2)


solid = part.part
